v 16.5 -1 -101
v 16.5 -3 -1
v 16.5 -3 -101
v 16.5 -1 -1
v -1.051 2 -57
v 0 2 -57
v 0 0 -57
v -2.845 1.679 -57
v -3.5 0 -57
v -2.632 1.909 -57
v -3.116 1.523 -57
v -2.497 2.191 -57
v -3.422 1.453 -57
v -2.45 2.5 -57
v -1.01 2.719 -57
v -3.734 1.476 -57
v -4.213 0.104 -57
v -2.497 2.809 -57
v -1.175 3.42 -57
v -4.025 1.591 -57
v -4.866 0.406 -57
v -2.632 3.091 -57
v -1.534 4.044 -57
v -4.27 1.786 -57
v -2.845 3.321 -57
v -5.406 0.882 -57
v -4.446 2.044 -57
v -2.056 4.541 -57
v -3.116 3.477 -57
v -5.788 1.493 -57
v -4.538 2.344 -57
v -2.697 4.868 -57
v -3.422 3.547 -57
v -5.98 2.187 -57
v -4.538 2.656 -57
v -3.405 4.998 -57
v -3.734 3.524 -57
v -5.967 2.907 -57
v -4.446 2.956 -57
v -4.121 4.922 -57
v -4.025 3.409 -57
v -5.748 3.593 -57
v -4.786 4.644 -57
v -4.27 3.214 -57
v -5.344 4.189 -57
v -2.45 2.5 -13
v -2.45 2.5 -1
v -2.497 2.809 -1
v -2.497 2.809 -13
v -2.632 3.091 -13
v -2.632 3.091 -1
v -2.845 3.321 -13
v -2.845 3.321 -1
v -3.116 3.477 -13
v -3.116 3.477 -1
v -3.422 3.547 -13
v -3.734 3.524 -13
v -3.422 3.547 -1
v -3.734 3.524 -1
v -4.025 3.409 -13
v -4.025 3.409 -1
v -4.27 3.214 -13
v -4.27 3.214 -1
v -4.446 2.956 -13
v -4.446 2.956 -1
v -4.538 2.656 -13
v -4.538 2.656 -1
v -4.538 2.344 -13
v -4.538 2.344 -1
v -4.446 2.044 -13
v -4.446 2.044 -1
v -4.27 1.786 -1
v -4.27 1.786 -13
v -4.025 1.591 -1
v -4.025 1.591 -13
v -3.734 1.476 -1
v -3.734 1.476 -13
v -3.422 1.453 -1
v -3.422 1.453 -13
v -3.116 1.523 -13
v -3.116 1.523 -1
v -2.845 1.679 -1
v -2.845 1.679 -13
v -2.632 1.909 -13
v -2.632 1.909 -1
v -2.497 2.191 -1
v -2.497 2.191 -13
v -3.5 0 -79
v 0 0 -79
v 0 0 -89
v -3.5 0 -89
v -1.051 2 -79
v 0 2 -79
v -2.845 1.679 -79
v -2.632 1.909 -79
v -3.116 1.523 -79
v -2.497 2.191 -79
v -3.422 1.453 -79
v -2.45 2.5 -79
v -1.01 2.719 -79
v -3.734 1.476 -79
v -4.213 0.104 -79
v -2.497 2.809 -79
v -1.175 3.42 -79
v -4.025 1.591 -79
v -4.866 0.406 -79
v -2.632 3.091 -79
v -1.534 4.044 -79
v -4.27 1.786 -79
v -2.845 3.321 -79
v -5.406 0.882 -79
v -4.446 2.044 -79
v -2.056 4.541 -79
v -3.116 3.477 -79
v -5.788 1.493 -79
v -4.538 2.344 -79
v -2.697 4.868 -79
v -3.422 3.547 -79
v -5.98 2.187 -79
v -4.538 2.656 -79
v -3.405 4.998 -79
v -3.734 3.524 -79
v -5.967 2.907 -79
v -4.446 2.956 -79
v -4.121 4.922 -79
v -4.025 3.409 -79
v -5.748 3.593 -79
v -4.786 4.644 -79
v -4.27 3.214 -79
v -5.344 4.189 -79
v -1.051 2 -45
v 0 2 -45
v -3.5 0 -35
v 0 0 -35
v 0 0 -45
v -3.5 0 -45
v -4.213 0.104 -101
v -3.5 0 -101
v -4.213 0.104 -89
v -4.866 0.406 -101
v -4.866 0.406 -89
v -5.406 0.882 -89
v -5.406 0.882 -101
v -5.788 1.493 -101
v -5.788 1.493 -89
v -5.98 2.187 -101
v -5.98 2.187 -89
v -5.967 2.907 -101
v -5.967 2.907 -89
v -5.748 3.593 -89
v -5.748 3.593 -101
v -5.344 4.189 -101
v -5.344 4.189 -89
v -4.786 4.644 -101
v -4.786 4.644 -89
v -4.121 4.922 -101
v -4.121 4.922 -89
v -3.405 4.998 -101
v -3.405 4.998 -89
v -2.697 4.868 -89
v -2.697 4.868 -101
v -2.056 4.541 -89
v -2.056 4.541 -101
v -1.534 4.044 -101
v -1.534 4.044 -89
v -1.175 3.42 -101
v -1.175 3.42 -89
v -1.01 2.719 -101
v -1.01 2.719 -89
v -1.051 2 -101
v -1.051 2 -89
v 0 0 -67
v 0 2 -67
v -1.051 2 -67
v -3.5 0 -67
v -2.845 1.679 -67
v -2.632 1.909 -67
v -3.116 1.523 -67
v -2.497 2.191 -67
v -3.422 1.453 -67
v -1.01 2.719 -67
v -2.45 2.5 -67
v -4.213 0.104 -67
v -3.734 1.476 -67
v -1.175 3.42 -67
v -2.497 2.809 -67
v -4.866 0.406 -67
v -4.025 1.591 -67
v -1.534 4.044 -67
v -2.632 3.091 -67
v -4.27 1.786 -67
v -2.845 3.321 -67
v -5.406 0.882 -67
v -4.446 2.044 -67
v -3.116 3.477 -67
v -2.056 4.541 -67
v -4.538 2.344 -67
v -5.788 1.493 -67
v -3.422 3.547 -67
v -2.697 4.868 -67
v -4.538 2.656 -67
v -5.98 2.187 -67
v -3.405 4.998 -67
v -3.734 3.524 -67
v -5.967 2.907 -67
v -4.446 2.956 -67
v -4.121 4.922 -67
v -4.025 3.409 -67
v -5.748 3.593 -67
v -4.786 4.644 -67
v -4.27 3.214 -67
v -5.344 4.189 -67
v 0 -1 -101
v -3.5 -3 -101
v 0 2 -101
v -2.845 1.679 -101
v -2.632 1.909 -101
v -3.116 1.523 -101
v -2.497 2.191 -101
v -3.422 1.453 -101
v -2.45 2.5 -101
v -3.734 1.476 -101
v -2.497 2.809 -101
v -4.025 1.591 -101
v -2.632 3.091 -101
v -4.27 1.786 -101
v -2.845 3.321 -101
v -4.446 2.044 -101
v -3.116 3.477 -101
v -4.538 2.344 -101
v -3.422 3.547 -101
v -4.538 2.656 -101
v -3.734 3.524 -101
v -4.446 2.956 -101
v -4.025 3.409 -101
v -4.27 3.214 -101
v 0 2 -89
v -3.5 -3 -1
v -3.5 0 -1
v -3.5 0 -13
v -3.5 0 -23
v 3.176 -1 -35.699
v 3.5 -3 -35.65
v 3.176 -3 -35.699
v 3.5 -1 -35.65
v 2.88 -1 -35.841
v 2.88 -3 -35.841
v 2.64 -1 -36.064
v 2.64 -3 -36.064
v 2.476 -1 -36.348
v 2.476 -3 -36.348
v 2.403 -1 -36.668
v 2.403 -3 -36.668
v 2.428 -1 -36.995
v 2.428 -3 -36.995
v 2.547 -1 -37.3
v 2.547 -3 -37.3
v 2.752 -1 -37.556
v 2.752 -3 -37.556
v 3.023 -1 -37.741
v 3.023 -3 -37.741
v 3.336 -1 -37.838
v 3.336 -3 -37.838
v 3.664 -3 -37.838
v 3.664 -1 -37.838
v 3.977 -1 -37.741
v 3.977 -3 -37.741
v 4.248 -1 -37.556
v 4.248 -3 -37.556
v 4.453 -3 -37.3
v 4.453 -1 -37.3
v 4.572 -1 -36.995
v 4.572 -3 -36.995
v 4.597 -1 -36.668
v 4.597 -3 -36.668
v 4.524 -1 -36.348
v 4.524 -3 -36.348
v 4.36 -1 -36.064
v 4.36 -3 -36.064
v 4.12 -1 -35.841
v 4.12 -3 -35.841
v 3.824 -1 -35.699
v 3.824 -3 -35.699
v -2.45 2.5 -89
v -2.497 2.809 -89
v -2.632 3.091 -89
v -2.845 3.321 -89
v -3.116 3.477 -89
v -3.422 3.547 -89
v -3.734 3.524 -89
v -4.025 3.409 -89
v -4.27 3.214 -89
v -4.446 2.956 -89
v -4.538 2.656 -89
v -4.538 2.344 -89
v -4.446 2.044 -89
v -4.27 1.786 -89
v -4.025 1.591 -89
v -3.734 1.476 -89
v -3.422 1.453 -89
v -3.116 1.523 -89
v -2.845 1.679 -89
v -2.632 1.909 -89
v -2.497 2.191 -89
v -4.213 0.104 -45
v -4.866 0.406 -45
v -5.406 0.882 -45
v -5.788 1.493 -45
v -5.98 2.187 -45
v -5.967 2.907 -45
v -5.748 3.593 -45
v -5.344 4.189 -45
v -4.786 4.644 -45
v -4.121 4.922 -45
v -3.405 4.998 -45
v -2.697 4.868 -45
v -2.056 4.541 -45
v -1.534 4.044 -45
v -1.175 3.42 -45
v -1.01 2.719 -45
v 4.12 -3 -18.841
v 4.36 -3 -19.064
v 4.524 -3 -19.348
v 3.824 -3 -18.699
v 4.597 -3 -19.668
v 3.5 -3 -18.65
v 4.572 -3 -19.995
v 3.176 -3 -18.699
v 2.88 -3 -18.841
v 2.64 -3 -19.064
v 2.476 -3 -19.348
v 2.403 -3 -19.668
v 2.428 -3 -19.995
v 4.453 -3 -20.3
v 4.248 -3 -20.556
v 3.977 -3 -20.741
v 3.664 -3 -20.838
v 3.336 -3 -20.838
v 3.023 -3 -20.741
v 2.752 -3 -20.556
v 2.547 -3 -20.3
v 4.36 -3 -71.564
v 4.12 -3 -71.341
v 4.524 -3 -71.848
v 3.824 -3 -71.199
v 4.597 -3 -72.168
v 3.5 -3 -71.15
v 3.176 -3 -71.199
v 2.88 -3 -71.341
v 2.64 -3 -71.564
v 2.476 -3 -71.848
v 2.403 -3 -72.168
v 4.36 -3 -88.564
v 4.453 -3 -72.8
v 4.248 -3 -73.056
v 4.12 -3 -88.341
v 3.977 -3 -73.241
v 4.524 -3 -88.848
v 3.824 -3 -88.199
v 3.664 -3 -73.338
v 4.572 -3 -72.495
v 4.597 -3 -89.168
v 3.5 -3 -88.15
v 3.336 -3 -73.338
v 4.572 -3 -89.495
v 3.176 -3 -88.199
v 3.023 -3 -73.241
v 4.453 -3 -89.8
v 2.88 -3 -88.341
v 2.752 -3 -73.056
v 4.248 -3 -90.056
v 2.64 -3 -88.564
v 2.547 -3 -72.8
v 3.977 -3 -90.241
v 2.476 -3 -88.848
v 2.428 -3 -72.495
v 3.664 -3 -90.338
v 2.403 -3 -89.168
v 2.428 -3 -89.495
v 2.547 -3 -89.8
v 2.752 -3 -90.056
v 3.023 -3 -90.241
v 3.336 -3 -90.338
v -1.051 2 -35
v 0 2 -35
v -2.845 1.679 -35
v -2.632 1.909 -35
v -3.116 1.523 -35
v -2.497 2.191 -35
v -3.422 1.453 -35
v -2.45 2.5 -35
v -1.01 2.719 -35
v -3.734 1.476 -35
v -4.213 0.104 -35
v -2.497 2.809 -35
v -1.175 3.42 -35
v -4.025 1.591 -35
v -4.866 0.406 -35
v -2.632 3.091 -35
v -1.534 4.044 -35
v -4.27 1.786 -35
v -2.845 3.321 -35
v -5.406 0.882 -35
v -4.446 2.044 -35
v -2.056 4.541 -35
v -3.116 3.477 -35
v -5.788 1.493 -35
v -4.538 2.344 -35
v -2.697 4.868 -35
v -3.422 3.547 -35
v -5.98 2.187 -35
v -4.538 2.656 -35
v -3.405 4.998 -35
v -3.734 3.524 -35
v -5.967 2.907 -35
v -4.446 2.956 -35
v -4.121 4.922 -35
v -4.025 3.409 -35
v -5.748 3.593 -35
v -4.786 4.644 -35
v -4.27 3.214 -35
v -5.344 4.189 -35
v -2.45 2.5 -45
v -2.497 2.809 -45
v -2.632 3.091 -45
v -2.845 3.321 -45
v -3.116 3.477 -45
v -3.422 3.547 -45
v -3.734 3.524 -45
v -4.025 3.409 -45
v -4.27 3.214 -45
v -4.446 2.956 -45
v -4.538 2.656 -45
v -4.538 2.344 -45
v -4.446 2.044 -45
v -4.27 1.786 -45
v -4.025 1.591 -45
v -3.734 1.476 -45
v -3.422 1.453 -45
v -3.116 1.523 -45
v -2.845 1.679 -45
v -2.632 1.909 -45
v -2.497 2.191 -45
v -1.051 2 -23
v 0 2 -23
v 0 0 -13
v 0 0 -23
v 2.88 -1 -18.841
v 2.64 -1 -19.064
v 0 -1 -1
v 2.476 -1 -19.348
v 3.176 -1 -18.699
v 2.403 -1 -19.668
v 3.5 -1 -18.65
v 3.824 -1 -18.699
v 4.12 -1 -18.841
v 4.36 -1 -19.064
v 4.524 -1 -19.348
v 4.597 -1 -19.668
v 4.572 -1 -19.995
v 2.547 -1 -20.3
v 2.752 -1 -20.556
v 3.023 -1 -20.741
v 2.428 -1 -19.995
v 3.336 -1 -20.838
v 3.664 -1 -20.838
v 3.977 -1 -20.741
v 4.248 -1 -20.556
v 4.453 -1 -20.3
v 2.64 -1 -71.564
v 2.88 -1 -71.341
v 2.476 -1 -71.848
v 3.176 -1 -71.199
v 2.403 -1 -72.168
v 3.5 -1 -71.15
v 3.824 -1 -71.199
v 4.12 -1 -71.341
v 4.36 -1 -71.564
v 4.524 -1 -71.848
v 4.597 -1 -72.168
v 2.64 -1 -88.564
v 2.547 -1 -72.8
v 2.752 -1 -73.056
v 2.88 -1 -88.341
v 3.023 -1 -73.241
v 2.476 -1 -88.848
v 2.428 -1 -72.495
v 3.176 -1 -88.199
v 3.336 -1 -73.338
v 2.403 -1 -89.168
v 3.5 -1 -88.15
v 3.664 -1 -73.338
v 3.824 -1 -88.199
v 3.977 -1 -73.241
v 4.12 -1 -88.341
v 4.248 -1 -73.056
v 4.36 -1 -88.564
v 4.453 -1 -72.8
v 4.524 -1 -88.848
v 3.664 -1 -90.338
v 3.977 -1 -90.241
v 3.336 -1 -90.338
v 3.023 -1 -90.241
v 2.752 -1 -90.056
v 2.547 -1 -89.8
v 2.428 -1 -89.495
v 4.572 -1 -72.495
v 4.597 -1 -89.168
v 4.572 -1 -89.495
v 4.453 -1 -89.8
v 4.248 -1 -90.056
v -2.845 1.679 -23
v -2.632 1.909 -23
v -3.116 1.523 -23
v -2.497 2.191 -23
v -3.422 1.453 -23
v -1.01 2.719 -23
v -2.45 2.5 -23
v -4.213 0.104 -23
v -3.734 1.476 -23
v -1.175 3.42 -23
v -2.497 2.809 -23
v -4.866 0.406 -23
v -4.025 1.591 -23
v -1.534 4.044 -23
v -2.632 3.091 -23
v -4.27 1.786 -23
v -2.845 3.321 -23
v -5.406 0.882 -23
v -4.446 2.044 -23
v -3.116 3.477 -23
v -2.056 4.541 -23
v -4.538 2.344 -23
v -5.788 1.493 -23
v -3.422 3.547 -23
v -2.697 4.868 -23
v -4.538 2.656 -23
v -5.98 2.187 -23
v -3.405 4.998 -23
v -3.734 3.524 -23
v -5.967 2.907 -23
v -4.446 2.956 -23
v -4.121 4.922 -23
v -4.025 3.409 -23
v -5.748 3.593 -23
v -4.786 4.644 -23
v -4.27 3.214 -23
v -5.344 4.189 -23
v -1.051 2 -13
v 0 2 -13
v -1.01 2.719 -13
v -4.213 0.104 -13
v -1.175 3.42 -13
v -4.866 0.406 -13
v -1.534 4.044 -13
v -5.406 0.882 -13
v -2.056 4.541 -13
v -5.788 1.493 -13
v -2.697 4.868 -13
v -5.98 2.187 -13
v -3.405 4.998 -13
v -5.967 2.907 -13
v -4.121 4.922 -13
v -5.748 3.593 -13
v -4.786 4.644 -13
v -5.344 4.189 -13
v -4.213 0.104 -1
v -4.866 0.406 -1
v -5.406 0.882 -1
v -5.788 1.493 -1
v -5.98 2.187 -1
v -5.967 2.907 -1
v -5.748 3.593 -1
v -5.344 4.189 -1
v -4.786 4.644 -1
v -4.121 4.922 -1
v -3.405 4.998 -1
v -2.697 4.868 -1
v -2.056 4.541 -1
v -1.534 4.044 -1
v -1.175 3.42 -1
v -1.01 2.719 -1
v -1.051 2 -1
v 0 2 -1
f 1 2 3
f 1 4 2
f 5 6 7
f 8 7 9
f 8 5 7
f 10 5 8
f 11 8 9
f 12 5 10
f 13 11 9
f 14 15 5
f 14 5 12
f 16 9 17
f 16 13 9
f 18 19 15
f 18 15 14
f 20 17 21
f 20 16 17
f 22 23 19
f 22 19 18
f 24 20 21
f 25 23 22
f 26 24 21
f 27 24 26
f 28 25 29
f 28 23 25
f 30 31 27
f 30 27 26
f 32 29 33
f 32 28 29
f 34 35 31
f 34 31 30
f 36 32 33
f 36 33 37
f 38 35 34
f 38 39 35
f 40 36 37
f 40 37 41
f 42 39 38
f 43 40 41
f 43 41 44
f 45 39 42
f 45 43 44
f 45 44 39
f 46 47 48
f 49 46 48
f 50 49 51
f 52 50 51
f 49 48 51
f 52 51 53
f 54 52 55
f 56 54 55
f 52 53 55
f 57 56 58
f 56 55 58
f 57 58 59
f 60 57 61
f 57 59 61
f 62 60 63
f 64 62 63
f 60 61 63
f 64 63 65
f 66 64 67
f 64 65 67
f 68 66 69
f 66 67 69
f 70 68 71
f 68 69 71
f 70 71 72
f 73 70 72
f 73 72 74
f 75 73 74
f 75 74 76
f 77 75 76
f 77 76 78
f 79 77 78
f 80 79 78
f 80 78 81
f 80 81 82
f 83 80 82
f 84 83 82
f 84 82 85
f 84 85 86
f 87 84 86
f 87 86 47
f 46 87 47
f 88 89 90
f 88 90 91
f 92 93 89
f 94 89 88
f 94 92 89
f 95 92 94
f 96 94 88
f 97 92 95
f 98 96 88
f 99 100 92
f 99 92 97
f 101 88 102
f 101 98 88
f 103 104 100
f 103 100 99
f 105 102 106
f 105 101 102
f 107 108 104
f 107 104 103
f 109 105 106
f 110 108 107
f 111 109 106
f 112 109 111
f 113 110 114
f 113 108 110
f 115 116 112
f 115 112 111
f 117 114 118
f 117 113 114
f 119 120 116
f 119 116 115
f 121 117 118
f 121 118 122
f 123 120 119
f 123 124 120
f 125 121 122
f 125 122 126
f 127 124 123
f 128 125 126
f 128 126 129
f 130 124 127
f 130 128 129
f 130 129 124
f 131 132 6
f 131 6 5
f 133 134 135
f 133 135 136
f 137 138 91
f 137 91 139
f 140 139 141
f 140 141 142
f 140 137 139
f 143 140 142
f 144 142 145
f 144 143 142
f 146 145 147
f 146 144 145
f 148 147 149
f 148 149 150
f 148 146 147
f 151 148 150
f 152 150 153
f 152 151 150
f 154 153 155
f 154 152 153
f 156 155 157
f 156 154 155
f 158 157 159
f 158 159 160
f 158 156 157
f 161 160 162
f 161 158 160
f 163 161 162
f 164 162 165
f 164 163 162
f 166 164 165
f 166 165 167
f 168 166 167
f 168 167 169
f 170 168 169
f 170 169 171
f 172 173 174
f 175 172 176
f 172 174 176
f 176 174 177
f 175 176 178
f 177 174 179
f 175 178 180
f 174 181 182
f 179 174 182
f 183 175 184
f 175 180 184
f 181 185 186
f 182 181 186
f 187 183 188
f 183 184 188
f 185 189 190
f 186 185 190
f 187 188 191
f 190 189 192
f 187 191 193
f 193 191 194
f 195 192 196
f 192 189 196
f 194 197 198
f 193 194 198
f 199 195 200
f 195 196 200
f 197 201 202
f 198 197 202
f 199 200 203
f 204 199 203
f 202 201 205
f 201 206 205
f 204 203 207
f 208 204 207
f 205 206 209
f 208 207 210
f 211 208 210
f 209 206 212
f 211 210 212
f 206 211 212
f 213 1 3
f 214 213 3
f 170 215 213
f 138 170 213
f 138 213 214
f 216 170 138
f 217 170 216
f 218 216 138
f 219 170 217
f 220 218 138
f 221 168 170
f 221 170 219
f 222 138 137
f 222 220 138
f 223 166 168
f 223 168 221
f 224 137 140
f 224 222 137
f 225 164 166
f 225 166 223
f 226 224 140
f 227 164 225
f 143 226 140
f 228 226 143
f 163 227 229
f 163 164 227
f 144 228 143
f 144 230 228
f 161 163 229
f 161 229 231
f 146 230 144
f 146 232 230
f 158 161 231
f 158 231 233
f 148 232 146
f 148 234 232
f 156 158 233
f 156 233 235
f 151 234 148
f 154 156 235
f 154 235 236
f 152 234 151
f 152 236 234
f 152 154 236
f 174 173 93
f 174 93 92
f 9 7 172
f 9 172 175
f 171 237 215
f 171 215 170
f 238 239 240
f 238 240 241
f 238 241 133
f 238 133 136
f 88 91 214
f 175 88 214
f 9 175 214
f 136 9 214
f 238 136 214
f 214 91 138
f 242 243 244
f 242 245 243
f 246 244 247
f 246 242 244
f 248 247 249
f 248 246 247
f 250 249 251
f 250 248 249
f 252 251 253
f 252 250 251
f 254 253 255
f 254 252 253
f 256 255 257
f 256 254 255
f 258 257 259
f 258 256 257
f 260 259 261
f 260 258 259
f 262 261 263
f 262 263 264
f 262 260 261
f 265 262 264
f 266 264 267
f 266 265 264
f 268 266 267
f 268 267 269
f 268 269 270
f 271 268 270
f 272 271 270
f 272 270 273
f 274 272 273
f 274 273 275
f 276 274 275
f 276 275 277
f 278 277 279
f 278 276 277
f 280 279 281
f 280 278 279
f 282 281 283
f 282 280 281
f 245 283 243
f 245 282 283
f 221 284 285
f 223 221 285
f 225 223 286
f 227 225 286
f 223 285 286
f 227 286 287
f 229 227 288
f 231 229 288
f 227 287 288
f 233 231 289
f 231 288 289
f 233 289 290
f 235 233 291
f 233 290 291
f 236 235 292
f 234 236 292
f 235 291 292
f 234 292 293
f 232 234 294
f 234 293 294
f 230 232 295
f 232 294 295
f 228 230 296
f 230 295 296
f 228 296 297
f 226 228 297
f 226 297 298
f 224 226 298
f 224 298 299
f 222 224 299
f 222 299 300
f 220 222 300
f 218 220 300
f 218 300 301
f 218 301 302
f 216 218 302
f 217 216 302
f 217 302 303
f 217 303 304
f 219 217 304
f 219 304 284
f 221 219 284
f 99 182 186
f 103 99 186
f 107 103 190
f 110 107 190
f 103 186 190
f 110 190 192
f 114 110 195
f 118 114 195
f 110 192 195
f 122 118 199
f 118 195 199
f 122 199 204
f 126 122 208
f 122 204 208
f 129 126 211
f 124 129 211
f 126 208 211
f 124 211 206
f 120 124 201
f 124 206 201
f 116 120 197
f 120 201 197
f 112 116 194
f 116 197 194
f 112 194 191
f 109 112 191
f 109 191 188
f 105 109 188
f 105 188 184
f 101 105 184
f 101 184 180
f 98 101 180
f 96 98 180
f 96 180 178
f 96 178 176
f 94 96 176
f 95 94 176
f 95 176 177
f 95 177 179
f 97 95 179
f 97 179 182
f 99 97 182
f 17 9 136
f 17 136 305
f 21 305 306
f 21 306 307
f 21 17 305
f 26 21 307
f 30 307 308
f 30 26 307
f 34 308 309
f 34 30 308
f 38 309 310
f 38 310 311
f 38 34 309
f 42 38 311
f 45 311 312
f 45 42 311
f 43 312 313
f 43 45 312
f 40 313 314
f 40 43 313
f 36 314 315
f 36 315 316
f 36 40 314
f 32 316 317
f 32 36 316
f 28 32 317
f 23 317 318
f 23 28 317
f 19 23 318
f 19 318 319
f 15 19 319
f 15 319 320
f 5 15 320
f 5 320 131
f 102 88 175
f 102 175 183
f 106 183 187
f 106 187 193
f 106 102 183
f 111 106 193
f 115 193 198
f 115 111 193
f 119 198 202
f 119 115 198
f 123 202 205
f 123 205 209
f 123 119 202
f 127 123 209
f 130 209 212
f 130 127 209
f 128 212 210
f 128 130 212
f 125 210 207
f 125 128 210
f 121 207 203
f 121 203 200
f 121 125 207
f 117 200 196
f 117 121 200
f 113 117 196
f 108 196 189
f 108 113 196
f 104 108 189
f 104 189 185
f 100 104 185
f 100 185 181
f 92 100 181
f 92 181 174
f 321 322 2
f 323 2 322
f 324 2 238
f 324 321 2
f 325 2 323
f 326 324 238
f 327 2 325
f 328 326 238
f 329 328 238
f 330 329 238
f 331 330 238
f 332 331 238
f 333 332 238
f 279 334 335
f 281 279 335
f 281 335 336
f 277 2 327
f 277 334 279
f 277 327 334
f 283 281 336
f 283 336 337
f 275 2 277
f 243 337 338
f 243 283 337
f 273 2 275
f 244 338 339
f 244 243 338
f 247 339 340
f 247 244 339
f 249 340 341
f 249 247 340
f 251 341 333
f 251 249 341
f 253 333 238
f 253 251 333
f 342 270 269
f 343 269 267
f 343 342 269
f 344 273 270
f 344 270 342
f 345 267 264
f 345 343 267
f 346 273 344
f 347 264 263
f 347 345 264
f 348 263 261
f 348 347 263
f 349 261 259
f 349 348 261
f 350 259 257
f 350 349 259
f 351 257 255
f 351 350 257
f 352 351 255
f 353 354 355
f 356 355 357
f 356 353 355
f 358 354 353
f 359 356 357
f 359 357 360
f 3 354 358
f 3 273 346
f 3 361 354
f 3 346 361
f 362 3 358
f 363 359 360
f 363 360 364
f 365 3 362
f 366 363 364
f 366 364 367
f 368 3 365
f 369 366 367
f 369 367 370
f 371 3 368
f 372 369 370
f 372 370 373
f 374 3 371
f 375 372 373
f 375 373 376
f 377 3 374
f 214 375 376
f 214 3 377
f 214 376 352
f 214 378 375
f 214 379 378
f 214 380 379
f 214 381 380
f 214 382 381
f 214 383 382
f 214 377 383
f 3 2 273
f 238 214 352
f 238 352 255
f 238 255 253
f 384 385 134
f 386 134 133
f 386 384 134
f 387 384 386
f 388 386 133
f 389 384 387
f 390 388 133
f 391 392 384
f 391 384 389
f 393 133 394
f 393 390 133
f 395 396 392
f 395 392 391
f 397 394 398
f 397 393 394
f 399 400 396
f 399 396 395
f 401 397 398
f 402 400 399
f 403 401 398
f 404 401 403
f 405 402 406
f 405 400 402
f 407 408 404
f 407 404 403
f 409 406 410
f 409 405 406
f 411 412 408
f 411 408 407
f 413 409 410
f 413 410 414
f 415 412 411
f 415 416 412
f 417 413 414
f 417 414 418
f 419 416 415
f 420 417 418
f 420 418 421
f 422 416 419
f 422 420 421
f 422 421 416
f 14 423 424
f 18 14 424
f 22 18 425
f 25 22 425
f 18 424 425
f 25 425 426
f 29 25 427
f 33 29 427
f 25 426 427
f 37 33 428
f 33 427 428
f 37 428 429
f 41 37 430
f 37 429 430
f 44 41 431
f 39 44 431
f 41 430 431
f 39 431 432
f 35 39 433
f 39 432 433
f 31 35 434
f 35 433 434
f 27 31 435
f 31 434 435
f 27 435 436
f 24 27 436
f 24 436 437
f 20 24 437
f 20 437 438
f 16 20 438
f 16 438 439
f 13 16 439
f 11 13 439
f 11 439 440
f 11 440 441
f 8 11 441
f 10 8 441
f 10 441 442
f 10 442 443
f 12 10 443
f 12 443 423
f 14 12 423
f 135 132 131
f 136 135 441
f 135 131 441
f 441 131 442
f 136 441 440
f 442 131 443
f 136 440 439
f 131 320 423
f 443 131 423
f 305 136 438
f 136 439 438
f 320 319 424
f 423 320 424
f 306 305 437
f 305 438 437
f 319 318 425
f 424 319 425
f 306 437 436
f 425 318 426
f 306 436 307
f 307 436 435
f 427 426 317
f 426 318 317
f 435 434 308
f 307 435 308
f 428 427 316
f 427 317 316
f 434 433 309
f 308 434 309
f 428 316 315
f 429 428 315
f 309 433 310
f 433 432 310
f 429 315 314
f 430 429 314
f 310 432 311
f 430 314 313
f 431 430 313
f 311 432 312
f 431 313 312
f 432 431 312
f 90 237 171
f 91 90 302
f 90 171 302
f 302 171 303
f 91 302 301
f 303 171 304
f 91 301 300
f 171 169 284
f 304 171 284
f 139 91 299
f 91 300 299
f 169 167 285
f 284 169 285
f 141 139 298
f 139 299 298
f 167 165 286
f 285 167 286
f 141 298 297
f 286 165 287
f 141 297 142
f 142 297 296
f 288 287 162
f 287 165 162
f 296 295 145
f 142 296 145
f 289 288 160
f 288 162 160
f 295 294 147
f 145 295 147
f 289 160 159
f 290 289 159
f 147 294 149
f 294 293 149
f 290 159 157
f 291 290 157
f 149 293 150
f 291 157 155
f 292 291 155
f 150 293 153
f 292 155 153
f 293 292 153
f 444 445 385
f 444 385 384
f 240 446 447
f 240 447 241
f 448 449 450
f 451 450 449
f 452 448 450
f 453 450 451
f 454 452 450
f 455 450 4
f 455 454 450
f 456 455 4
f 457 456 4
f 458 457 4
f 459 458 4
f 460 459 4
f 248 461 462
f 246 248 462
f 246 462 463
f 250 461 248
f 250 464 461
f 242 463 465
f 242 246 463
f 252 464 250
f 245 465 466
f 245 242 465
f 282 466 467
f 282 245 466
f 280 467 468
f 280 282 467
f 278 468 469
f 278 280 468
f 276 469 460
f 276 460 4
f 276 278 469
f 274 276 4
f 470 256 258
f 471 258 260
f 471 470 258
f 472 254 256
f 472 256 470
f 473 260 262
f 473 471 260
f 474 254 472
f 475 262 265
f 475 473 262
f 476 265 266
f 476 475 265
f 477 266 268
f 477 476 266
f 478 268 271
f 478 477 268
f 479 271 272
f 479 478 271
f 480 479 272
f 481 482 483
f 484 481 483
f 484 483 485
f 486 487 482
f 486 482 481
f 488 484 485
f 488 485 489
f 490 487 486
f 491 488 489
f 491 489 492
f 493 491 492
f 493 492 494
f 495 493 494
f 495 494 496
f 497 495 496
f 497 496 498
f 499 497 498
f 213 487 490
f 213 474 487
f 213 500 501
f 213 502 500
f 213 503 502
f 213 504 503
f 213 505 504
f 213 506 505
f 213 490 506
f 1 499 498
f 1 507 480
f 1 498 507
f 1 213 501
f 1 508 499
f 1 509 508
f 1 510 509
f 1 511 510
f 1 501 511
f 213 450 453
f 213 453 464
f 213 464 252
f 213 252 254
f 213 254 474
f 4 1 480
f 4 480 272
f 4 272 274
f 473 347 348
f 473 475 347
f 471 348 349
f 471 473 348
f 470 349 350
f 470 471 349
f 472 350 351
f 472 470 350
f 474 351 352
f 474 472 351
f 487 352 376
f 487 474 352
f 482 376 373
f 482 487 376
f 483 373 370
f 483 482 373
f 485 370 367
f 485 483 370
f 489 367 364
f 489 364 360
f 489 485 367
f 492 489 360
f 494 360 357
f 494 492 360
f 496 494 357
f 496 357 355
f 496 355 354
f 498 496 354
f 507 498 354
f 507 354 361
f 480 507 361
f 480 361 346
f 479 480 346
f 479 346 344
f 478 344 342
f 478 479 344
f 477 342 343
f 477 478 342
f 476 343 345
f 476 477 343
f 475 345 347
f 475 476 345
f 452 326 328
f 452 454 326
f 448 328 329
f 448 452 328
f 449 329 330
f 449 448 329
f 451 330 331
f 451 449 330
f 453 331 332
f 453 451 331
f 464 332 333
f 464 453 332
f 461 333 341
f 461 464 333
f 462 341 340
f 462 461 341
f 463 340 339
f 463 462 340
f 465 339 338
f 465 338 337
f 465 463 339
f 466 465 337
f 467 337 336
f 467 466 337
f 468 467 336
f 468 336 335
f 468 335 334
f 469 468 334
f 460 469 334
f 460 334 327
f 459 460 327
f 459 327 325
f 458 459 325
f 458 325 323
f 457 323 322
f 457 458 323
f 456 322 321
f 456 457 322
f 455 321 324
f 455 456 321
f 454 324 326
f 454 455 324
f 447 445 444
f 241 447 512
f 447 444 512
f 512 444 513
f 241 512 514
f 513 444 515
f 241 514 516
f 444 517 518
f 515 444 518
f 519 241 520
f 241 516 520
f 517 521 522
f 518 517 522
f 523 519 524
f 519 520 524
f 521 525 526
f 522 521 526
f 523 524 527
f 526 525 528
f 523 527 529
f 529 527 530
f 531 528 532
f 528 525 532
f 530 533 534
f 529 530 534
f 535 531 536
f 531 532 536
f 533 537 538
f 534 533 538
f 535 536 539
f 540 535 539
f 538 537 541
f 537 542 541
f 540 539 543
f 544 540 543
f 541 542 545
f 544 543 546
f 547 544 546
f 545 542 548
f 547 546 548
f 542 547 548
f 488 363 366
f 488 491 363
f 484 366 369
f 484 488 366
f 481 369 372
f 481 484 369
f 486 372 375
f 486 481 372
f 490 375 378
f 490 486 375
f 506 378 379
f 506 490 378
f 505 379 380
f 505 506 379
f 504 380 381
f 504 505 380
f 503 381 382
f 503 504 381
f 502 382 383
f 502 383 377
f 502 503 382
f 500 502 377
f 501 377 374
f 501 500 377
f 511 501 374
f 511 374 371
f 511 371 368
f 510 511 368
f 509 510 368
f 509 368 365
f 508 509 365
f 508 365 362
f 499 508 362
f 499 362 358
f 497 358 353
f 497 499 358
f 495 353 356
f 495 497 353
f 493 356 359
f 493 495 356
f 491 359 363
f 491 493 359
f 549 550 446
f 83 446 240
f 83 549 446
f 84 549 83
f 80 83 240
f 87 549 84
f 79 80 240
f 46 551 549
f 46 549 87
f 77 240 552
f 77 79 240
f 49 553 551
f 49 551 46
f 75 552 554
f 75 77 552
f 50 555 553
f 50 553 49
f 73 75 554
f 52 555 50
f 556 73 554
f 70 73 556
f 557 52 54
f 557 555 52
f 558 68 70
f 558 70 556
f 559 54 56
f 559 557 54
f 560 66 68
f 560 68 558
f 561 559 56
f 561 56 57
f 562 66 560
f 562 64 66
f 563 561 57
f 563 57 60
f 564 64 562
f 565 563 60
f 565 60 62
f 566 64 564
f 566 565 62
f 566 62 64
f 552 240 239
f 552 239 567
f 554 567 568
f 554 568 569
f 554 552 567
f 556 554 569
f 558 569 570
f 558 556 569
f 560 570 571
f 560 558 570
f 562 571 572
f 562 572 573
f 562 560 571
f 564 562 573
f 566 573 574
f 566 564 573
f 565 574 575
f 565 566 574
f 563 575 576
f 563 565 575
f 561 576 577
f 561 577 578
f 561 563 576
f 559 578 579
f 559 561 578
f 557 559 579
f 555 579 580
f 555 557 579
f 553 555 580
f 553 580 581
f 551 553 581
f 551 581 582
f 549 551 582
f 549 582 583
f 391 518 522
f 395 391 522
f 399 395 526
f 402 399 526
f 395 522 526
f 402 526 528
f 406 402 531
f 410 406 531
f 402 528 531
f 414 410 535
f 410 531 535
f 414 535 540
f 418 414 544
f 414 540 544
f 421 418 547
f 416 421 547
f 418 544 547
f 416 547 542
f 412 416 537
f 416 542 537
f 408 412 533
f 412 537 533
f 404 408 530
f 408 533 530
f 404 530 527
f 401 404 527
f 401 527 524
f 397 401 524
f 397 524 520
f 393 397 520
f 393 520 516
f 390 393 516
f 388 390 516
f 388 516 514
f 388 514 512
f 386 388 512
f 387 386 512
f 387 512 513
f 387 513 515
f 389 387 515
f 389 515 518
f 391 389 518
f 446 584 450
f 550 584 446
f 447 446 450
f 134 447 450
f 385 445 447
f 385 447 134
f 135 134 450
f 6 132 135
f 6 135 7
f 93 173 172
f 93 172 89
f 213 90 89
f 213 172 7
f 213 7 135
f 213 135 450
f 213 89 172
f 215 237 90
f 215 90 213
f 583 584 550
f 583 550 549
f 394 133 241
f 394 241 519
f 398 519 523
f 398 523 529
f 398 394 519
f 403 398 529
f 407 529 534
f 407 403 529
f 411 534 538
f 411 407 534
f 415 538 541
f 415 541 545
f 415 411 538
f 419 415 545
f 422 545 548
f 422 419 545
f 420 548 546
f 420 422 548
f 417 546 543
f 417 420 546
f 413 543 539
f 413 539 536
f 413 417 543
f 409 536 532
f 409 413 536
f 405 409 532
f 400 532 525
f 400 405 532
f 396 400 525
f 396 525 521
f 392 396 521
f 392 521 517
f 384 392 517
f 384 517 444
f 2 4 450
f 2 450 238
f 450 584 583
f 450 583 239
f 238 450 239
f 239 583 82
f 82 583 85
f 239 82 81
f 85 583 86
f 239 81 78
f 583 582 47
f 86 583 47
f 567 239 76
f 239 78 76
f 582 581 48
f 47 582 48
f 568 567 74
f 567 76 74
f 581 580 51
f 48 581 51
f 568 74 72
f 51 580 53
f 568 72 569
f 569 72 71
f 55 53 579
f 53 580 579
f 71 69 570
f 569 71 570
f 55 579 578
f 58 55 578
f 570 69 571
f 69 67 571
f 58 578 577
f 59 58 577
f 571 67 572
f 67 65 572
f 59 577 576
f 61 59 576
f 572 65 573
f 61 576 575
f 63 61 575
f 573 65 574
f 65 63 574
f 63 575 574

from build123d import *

# Parameters (mm, degrees)
SKETCH_1_W                     = 9.5
SKETCH_1_H                     = 13.25
EXTRUDE_1_DEPTH                = 2
EXTRUDE_2_DEPTH                = 12
PATTERN_LINEAR_1_COUNT         = 5
PATTERN_LINEAR_1_PITCH         = 22
HOLE_WIZARD_2_2_2_2_1_D        = 2.1
EXTRUDE_3_DEPTH                = 12
SKETCH_7_W                     = 1.05
SKETCH_7_H                     = 15
EXTRUDE_4_DEPTH                = 110
SKETCH_13_W                    = 1
SKETCH_13_H                    = 38.681287062
HOLE_WIZARD_2_0_2_2_AT_2_COUNT = 2
HOLE_WIZARD_2_0_2_2_AT_2_PITCH = 47
CUT_EXTRUDE_1_DEPTH            = 140.431241936
CUT_EXTRUDE_1_DEPTH_BACK       = 140.431241936
SKETCH_14_W                    = 52.846717088
SKETCH_14_H                    = 8
EXTRUDE23_DEPTH                = 109
EXTRUDE23_DEPTH_BACK           = 77
SKETCH18_W                     = 126.116691802
SKETCH18_H                     = 130.968537131
SKETCH20_W                     = 20
SKETCH20_H                     = 100
EXTRUDE24_DEPTH                = 2
SKETCH21_R                     = 1.1
EXTRUDE25_DEPTH                = 2
EXTRUDE26_DEPTH                = 136
EXTRUDE26_DEPTH_BACK           = 62
SKETCH22_W                     = 135.680863596
SKETCH22_H                     = 114.529775135
SKETCH_15_W                    = 16.5
SKETCH_15_H                    = 100
CUT_EXTRUDE_2_DEPTH            = 1
SKETCH_16_W                    = 20
SKETCH_16_H                    = 100
SKETCH_16_R                    = 1.1
EXTRUDE_5_DEPTH                = 1


with BuildPart() as part:
    # 草图1 → 凸台-拉伸1 (new body)
    with BuildSketch(Plane(origin=(0, 0, 0), x_dir=(1, 0, 0), z_dir=(0, 1, 0))):
        Polygon((21.5, 0), (21.5, 110), (9, 110), (0, 101), (0, 0), align=None)
        Polygon((19.121320344, 101), (4.242640687, 101), (8.121320344, 104.878679656), (19.121320344, 104.878679656), align=None, mode=Mode.SUBTRACT)
        with Locations((10.75, 12.625)):
            Rectangle(SKETCH_1_W, SKETCH_1_H, mode=Mode.SUBTRACT)
        with Locations((10.75, 37.875)):
            Rectangle(SKETCH_1_W, SKETCH_1_H, mode=Mode.SUBTRACT)
        with Locations((10.75, 63.125)):
            Rectangle(SKETCH_1_W, SKETCH_1_H, mode=Mode.SUBTRACT)
        with Locations((10.75, 88.375)):
            Rectangle(SKETCH_1_W, SKETCH_1_H, mode=Mode.SUBTRACT)
    extrude(amount=EXTRUDE_1_DEPTH)

    # 草图2 → 凸台-拉伸2 (add)
    with BuildSketch(Plane(origin=(0, 0, -101), x_dir=(-1, 0, 0), z_dir=(0, 0, -1))):
        with BuildLine():
            Line((0, 2), (0, 0))
            Line((0, 0), (3.5, 0))
            ThreePointArc((3.5, 0), (5.08113883, 4.436491673), (1.050510257, 2))
            Line((1.050510257, 2), (0, 2))
        make_face()
    extrude_2 = extrude(amount=-EXTRUDE_2_DEPTH)

    # 阵列(线性)1: 凸台-拉伸2 ×5
    with Locations(*[(0, 0, i * PATTERN_LINEAR_1_PITCH) for i in range(1, PATTERN_LINEAR_1_COUNT)]):
        add(extrude_2)

    # Ø2.2 (2.2) 直径孔1 (through all)
    with Locations(Plane(origin=(0, 0, -101), x_dir=(-1, 0, 0), z_dir=(0, 0, -1))):
        with Locations((3.5, 2.5)):
            Hole(HOLE_WIZARD_2_2_2_2_1_D / 2)

    # 草图8 → 凸台-拉伸4 (add)
    with BuildSketch(Plane.XY):
        with BuildLine():
            ThreePointArc((31.5, 0), (34.178784027, 0.532843272), (36.449747468, 2.050252532))
            Line((36.449747468, 2.050252532), (39.577164466, 5.17766953))
            ThreePointArc((39.577164466, 5.17766953), (57.254833996, 12.5), (74.932503526, 5.17766953))
            Line((74.932503526, 5.17766953), (76.346717088, 6.591883092))
            ThreePointArc((76.346717088, 6.591883092), (57.254833996, 14.5), (38.162950904, 6.591883092))
            Line((38.162950904, 6.591883092), (35.035533906, 3.464466094))
            ThreePointArc((35.035533906, 3.464466094), (33.413417162, 2.380602337), (31.5, 2))
            Line((31.5, 2), (21.5, 2))
            Line((21.5, 2), (21.5, 0))
            Line((21.5, 0), (31.5, 0))
        make_face()
    extrude(amount=-EXTRUDE_4_DEPTH)

    # 草图13 → Ø2.0 (2) 直径孔2 (revolve, cut)
    with BuildSketch(Plane(origin=(66.489377866, 12.871700761, -5), x_dir=(-0.9396926207859126, 0.34202014332565694, 0), z_dir=(0, 0, 1))):
        with Locations((0.5, 19.340643531)):
            Rectangle(SKETCH_13_W, SKETCH_13_H)
    hole_wizard_2_0_2_2 = revolve(axis=Axis((68.661205776, 18.838748903, -5), (-0.3420201433256569, -0.9396926207859128, 0)), mode=Mode.SUBTRACT)

    # Ø2.0 (2) 直径孔2 at 2: Ø2.0 (2) 直径孔2 ×2
    with Locations(*[(0, 0, -i * HOLE_WIZARD_2_0_2_2_AT_2_PITCH) for i in range(1, HOLE_WIZARD_2_0_2_2_AT_2_COUNT)]):
        add(hole_wizard_2_0_2_2, mode=Mode.SUBTRACT)

    # 草图14 → 切除-拉伸1 (cut, two sides: drawn at the far end of the back side and taken through both)
    with BuildSketch(Plane(origin=(0, 2, 0), x_dir=(1, 0, 0), z_dir=(0, 1, 0)).offset(-CUT_EXTRUDE_1_DEPTH_BACK)):
        with BuildLine():
            add(Edge.make_bspline(
                [(65.543349365, 52), (65.543349365, 51.867858182), (65.568139282, 51.738193315), (65.663651177, 51.49599396), (65.734288369, 51.385069362), (65.909329104, 51.20058787), (66.014984918, 51.126085586), (66.242291721, 51.026337096), (66.366299142, 51.000069682), (66.611454679, 50.999930602), (66.734292904, 51.025809235), (66.960669981, 51.125923854), (67.063423157, 51.199243917), (67.237262204, 51.385832013), (67.305425299, 51.495895945), (67.398649167, 51.738239585), (67.422691544, 51.869119898), (67.422777552, 52.130169285), (67.398544475, 52.261724961), (67.306168595, 52.502477284), (67.237041074, 52.614131138), (67.065581718, 52.798710334), (66.962099904, 52.873181003), (66.736029766, 52.973681753), (66.61428089, 52.999865952), (66.366377399, 53.000133023), (66.24402893, 52.974291959), (66.014886358, 52.874003493), (65.90992169, 52.799906628), (65.647004042, 52.52319771), (65.543349365, 52.264283637), (65.543349365, 52)],
                knots=[0, 0, 0, 0, 0.0625, 0.0625, 0.125, 0.125, 0.1875, 0.1875, 0.25, 0.25, 0.3125, 0.3125, 0.375, 0.375, 0.4375, 0.4375, 0.5, 0.5, 0.5625, 0.5625, 0.625, 0.625, 0.6875, 0.6875, 0.75, 0.75, 0.8125, 0.8125, 0.875, 0.875, 1, 1, 1, 1], degree=3))
        make_face()
        with BuildLine():
            add(Edge.make_bspline(
                [(65.543349365, 5), (65.543349365, 4.867858182), (65.568139282, 4.738193315), (65.663651177, 4.49599396), (65.734288369, 4.385069362), (65.909329104, 4.20058787), (66.014984918, 4.126085586), (66.242291721, 4.026337096), (66.366299142, 4.000069682), (66.611454679, 3.999930602), (66.734292904, 4.025809235), (66.960669981, 4.125923854), (67.063423157, 4.199243917), (67.237262204, 4.385832013), (67.305425299, 4.495895945), (67.398649167, 4.738239585), (67.422691544, 4.869119898), (67.422777552, 5.130169285), (67.398544475, 5.261724961), (67.306168595, 5.502477284), (67.237041074, 5.614131138), (67.065581718, 5.798710334), (66.962099904, 5.873181003), (66.736029766, 5.973681753), (66.61428089, 5.999865952), (66.366377399, 6.000133023), (66.24402893, 5.974291959), (66.014886358, 5.874003493), (65.90992169, 5.799906628), (65.647004042, 5.52319771), (65.543349365, 5.264283637), (65.543349365, 5)],
                knots=[0, 0, 0, 0, 0.0625, 0.0625, 0.125, 0.125, 0.1875, 0.1875, 0.25, 0.25, 0.3125, 0.3125, 0.375, 0.375, 0.4375, 0.4375, 0.5, 0.5, 0.5625, 0.5625, 0.625, 0.625, 0.6875, 0.6875, 0.75, 0.75, 0.8125, 0.8125, 0.875, 0.875, 1, 1, 1, 1], degree=3))
        make_face()
        with Locations((46.923358544, 14)):
            Rectangle(SKETCH_14_W, SKETCH_14_H)
        with Locations((46.923358544, 61)):
            Rectangle(SKETCH_14_W, SKETCH_14_H)
    extrude(amount=CUT_EXTRUDE_1_DEPTH + CUT_EXTRUDE_1_DEPTH_BACK, mode=Mode.SUBTRACT)

    # Sketch18 → Extrude23 (cut, two sides: drawn at the far end of the back side and taken through both)
    with BuildSketch(Plane(origin=(0, 2, 0), x_dir=(1, 0, 0), z_dir=(0, 1, 0)).offset(-EXTRUDE23_DEPTH_BACK)):
        with Locations((63.058345901, 59.008314148)):
            Rectangle(SKETCH18_W, SKETCH18_H)
    extrude(amount=EXTRUDE23_DEPTH + EXTRUDE23_DEPTH_BACK, mode=Mode.SUBTRACT)


with BuildPart() as body_2:
    # 草图5 → 凸台-拉伸3 (new body)
    with BuildSketch(Plane(origin=(9, 0, 0), x_dir=(0, 0, -1), z_dir=(1, 0, 0))):
        with BuildLine():
            Line((-111.050510257, 0), (-109.949581771, 0))
            Line((-109.949581771, 0), (-109.949581771, 2))
            Line((-109.949581771, 2), (-113.5, 2))
            ThreePointArc((-113.5, 2), (-115.08113883, -2.436491673), (-111.050510257, 0))
        make_face()
    extrude(amount=-EXTRUDE_3_DEPTH)

    # 草图7 → Ø2.2 (2.2) 直径孔2 (revolve, cut)
    with BuildSketch(Plane(origin=(9, -0.5, 113.5), x_dir=(0, 0, -1), z_dir=(0, 1, 0))):
        with Locations((0.525, 7.5)):
            Rectangle(SKETCH_7_W, SKETCH_7_H)
    revolve(axis=Axis((15.35, -0.5, 113.5), (-1, 0, 0)), mode=Mode.SUBTRACT)

    # Sketch22 → Extrude26 (cut, two sides: drawn at the far end of the back side and taken through both)
    with BuildSketch(Plane(origin=(0, 0, 0), x_dir=(1, 0, 0), z_dir=(0, 1, 0)).offset(-EXTRUDE26_DEPTH_BACK)):
        with Locations((8.341327017, -106.523866824)):
            Rectangle(SKETCH22_W, SKETCH22_H)
    extrude(amount=EXTRUDE26_DEPTH + EXTRUDE26_DEPTH_BACK, mode=Mode.SUBTRACT)


with BuildPart() as extrude23_piece_1:
    # of the separate pieces the step leaves, piece 1, a body of its own (extrude23_pieces)
    add(part.part.solids().sort_by_distance((0, 2, -101))[0])



with BuildPart() as extrude23_piece_2:
    # of the separate pieces the step leaves, piece 2, a body of its own (extrude23_pieces)
    add(part.part.solids().sort_by_distance((0, 2, -79))[0])


with BuildPart() as extrude23_piece_3:
    # of the separate pieces the step leaves, piece 3, a body of its own (extrude23_pieces)
    add(part.part.solids().sort_by_distance((0, 2, -57))[0])


with BuildPart() as extrude23_piece_4:
    # of the separate pieces the step leaves, piece 4, a body of its own (extrude23_pieces)
    add(part.part.solids().sort_by_distance((0, 2, -35))[0])


with BuildPart() as extrude23_piece_5:
    # of the separate pieces the step leaves, piece 5, a body of its own (extrude23_pieces)
    add(part.part.solids().sort_by_distance((-1.050510257, 2, -1))[0])


with BuildPart() as extrude23_piece_1_1:
    add(extrude23_piece_1.part)

    add(extrude23_piece_2.part)  # Extrude24 merges Extrude23 piece 2

    add(extrude23_piece_3.part)  # Extrude24 merges Extrude23 piece 3

    add(extrude23_piece_4.part)  # Extrude24 merges Extrude23 piece 4

    add(extrude23_piece_5.part)  # Extrude24 merges Extrude23 piece 5
    # Sketch20 → Extrude24 (add)
    with BuildSketch(Plane(origin=(0, 0, 0), x_dir=(-1, 0, 0), z_dir=(0, -1, 0))):
        with Locations((-6.5, 51)):
            Rectangle(SKETCH20_W, SKETCH20_H)
    extrude(amount=EXTRUDE24_DEPTH)

    # Sketch21 → Extrude25 (cut)
    with BuildSketch(Plane(origin=(0, 0, 0), x_dir=(1, 0, 0), z_dir=(0, 1, 0))):
        with Locations(Location((3.5, 89.25, 0), (0, 0, 270))):
            Circle(SKETCH21_R)
        with Locations(Location((3.5, 72.25, 0), (0, 0, 270))):
            Circle(SKETCH21_R)
        with Locations(Location((3.5, 36.75, 0), (0, 0, 270))):
            Circle(SKETCH21_R)
        with Locations(Location((3.5, 19.75, 0), (0, 0, 270))):
            Circle(SKETCH21_R)
    extrude(amount=-EXTRUDE25_DEPTH, mode=Mode.SUBTRACT)

    # 草图15 → 切除-拉伸2 (cut)
    with BuildSketch(Plane(origin=(0, 0, 0), x_dir=(1, 0, 0), z_dir=(0, 1, 0))):
        with Locations((8.25, 51)):
            Rectangle(SKETCH_15_W, SKETCH_15_H)
    extrude(amount=-CUT_EXTRUDE_2_DEPTH, mode=Mode.SUBTRACT)

    # 草图16 → 凸台-拉伸5 (add)
    with BuildSketch(Plane(origin=(0, -2, 0), x_dir=(-1, 0, 0), z_dir=(0, -1, 0))):
        with Locations((-6.5, 51)):
            Rectangle(SKETCH_16_W, SKETCH_16_H)
        with Locations(Location((-3.5, 89.25, 0), (0, 0, 270))):
            Circle(SKETCH_16_R, mode=Mode.SUBTRACT)
        with Locations(Location((-3.5, 72.25, 0), (0, 0, 270))):
            Circle(SKETCH_16_R, mode=Mode.SUBTRACT)
        with Locations(Location((-3.5, 36.75, 0), (0, 0, 270))):
            Circle(SKETCH_16_R, mode=Mode.SUBTRACT)
        with Locations(Location((-3.5, 19.75, 0), (0, 0, 270))):
            Circle(SKETCH_16_R, mode=Mode.SUBTRACT)
    extrude(amount=EXTRUDE_5_DEPTH)


solid = extrude23_piece_1_1.part
